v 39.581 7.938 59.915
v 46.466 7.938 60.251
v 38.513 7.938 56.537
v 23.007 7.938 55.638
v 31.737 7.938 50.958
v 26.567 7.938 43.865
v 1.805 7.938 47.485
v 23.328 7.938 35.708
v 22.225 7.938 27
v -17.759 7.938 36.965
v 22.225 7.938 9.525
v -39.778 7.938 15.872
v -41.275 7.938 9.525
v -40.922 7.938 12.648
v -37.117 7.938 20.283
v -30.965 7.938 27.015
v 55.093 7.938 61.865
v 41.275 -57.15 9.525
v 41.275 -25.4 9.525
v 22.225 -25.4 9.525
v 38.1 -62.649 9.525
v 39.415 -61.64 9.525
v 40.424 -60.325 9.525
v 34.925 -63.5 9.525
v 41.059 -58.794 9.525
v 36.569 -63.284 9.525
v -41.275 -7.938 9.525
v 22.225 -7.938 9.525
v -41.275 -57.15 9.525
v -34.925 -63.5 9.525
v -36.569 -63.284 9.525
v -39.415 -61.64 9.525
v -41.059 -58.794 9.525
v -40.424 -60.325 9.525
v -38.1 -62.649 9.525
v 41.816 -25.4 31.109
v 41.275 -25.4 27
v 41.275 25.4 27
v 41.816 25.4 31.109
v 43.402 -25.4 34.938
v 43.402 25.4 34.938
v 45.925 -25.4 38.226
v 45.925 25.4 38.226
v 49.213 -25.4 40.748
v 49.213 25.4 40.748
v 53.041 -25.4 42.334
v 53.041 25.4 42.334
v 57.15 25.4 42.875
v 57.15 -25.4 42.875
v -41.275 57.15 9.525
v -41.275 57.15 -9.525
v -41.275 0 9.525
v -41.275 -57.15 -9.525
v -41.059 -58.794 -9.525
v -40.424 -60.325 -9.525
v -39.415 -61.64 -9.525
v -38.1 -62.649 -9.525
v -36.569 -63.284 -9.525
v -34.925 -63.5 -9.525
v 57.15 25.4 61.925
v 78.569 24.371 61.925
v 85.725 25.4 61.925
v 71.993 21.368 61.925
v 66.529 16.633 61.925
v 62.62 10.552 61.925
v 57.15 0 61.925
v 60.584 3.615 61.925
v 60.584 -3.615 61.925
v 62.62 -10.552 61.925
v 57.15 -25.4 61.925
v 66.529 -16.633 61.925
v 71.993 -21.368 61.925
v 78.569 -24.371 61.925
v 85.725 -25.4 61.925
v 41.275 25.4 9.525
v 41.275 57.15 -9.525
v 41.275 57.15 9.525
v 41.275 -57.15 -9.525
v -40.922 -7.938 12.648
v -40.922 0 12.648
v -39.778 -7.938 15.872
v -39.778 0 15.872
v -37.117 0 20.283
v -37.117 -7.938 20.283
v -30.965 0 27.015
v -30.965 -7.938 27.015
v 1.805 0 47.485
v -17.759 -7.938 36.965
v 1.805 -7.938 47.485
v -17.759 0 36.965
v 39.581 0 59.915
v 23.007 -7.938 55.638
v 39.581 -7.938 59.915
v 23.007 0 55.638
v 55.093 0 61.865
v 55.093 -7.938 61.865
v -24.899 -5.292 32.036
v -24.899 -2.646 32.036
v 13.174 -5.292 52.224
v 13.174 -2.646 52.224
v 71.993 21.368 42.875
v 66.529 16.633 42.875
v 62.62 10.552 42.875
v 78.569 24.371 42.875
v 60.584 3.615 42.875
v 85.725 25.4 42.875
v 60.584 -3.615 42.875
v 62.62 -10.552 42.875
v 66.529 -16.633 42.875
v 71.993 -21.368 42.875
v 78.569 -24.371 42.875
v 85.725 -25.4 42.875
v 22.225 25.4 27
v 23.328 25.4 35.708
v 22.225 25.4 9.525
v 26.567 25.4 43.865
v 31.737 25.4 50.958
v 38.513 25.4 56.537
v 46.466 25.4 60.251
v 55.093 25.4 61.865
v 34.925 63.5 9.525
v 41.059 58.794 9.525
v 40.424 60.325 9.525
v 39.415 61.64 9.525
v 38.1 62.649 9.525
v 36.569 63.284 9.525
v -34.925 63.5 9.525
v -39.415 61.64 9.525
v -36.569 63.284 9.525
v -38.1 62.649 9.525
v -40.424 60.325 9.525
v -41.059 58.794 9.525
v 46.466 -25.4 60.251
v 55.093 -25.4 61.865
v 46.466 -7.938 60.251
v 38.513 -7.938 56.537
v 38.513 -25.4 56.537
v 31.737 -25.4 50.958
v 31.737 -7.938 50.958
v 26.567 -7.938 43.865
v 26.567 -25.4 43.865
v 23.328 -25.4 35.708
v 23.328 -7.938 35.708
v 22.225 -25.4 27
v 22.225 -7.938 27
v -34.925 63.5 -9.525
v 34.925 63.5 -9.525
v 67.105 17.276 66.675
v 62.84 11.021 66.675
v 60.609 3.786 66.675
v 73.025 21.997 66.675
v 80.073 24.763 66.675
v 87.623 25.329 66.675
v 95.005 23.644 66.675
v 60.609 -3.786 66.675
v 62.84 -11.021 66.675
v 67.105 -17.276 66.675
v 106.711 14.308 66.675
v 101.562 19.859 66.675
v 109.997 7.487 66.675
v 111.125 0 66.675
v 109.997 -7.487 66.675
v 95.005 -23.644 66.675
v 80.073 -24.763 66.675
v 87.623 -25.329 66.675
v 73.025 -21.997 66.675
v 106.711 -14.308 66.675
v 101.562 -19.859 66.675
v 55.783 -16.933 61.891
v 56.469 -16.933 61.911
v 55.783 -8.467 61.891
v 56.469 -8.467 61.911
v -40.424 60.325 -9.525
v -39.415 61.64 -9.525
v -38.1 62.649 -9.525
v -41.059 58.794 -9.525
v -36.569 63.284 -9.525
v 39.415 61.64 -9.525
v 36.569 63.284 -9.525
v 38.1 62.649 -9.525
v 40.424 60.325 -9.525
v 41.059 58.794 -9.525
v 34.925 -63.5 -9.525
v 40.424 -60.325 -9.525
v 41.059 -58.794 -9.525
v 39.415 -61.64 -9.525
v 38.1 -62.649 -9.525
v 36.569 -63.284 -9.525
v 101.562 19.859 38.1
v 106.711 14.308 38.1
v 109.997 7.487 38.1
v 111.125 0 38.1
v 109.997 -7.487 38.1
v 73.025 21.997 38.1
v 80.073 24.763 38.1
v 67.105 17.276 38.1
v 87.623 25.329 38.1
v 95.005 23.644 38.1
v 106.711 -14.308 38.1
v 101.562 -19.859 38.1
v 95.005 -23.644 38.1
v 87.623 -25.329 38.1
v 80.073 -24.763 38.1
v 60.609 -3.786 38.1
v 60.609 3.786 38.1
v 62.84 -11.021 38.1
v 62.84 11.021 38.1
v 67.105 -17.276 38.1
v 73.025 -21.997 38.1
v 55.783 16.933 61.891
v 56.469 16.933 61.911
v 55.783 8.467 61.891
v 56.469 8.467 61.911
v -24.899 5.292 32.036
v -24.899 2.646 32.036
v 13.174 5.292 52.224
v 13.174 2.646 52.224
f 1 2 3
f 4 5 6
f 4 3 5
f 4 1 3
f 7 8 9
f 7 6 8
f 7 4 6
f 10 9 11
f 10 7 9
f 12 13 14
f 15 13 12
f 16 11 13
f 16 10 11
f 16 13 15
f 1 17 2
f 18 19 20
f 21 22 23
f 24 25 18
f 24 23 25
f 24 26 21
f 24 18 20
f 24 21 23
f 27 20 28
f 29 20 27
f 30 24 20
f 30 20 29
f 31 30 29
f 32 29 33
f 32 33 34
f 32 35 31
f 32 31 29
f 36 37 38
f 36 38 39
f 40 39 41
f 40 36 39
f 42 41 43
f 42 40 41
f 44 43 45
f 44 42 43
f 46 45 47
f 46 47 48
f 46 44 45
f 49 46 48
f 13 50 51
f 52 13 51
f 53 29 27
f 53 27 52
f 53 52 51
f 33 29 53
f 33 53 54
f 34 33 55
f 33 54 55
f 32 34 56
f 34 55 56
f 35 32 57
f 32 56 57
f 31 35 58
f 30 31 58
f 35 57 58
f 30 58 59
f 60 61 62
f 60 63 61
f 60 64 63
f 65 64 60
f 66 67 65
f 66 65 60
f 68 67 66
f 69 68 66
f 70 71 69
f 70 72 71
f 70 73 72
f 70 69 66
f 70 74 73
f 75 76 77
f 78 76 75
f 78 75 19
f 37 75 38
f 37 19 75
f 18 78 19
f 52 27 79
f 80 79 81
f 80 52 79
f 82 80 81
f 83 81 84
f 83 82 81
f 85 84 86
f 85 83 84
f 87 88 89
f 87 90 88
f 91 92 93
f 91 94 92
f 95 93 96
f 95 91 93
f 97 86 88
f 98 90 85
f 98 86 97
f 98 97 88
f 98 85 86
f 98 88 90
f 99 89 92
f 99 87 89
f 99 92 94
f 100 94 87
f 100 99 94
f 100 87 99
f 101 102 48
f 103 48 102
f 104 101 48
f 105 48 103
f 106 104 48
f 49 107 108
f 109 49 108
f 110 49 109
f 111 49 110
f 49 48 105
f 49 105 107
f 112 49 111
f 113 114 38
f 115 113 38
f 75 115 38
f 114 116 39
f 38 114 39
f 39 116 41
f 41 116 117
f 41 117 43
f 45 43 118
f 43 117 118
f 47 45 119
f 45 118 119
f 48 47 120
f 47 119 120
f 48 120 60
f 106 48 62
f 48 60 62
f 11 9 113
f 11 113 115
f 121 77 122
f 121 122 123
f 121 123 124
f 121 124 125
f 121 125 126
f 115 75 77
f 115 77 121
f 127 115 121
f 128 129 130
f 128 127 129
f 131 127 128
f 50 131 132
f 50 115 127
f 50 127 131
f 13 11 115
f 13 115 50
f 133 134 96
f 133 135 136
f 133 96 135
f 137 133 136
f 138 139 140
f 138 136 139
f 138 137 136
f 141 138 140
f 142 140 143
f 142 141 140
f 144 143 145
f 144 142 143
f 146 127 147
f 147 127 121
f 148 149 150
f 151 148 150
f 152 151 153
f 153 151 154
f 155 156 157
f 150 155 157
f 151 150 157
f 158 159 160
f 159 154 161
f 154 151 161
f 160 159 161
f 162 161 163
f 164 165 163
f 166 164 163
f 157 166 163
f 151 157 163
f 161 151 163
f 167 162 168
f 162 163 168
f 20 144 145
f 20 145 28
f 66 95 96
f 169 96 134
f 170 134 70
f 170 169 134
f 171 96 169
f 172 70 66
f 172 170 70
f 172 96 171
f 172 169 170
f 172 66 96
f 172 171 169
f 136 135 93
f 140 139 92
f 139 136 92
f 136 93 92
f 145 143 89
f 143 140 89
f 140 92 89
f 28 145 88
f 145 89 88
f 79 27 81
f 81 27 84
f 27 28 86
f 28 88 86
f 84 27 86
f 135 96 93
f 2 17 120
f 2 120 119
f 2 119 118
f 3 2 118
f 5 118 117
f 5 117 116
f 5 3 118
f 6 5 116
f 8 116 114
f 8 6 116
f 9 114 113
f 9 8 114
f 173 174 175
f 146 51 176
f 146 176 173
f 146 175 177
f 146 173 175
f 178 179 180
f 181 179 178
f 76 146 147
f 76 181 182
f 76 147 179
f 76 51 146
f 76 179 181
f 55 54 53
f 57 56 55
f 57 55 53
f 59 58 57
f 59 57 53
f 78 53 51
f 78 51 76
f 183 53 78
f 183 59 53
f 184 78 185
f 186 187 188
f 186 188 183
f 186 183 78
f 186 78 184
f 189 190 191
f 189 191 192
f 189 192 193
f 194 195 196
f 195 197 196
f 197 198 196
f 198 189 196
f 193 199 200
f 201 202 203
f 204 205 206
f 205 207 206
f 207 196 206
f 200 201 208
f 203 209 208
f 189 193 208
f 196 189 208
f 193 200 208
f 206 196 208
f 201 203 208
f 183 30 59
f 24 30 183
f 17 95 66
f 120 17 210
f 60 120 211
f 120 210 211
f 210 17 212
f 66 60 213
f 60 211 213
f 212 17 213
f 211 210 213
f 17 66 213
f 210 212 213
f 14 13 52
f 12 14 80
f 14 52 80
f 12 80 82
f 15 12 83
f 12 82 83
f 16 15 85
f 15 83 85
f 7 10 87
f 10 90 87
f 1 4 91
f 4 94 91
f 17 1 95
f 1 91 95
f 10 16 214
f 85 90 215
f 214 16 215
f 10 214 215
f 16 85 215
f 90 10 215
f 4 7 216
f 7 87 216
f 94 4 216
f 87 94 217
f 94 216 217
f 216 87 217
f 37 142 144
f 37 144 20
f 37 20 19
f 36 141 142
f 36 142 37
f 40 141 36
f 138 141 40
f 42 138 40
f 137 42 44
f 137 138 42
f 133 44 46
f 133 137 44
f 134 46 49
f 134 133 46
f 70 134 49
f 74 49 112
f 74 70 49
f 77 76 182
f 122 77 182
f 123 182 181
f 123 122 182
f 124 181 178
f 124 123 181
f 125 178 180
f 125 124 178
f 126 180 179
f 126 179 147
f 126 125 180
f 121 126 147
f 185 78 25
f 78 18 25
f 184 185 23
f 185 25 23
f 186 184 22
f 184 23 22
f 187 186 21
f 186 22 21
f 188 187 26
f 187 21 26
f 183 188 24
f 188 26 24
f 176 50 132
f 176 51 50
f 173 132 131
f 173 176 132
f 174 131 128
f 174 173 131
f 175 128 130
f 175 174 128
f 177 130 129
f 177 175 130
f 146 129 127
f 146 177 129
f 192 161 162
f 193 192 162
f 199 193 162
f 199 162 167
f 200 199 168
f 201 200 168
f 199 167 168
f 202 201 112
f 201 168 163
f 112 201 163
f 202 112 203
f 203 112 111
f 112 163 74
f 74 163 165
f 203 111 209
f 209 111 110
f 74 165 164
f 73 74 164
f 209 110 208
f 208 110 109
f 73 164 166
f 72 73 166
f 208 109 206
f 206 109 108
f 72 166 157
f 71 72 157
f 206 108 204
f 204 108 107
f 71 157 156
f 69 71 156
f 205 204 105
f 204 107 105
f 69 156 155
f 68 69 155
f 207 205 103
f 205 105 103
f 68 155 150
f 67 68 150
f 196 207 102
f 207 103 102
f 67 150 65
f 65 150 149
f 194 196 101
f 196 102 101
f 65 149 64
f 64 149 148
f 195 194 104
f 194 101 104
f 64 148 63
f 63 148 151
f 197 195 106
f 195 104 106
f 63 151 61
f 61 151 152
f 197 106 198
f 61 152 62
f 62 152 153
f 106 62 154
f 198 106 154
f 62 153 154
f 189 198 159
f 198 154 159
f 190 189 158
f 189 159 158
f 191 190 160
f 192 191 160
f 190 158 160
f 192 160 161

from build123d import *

# Parameters (mm, degrees)
F1_DEPTH = 63.5
F2_DEPTH = 25.4
F3_DEPTH = 7.9375
F5_R     = 6.35


with BuildPart() as f1:
    # F0 (on Front) → F1 (new body, symmetric)
    with BuildSketch(Plane.XZ):
        Polygon((-41.275, 9.525), (-41.275, -9.525), (41.275, -9.525), (41.275, 9.525), (22.225, 9.525), align=None)
    extrude(amount=F1_DEPTH, both=True)

    # F0 (on Front) → F2 (join, symmetric)
    with BuildSketch(Plane.XZ):
        Polygon((85.725, 61.9252), (60.325, 61.9252), (60.325, 42.8752), (85.725, 42.8752), (85.725, 52.3875), align=None)
        with BuildLine():
            Line((22.225, 9.525), (41.275, 9.525))
            Line((41.275, 9.525), (41.275, 27.0002))
            ThreePointArc((41.275, 27.0002), (45.92468, 38.22552), (57.15, 42.8752))
            Line((57.15, 42.8752), (60.325, 42.8752))
            Line((60.325, 42.8752), (60.325, 61.9252))
            Line((60.325, 61.9252), (57.15, 61.9252))
            add(Edge.make_bspline(
                [(55.092977, 61.86457), (55.785837, 61.89427), (56.471675, 61.914556), (57.15, 61.9252)],
                knots=[109.502305, 109.502305, 109.502305, 109.502305, 111.504536, 111.504536, 111.504536, 111.504536], degree=3))
            ThreePointArc((55.092977, 61.86457), (31.737433, 50.957601), (22.225, 27.0002))
            Line((22.225, 27.0002), (22.225, 9.525))
        make_face()
    extrude(amount=F2_DEPTH, both=True)

    # F0 (on Front) → F3 (join, symmetric)
    with BuildSketch(Plane.XZ):
        with BuildLine():
            add(Edge.make_bspline(
                [(-41.275, 9.525), (-41.696727, 30.455088), (17.200338, 60.240237), (55.092977, 61.86457)],
                knots=[0, 0, 0, 0, 109.502305, 109.502305, 109.502305, 109.502305], degree=3))
            Line((-41.275, 9.525), (22.225, 9.525))
            Line((22.225, 9.525), (22.225, 27.0002))
            ThreePointArc((22.225, 27.0002), (31.737433, 50.957601), (55.092977, 61.86457))
        make_face()
    extrude(amount=F3_DEPTH, both=True)

    # F0 (on Front) → F4 (revolve)
    with BuildSketch(Plane.XZ):
        Polygon((85.725, 66.675), (85.725, 61.9252), (85.725, 52.3875), (85.725, 42.8752), (85.725, 38.1), (111.125, 38.1), (111.125, 66.675), align=None)
    revolve(axis=Axis((85.725, 0, 47.63135), (0, 0, -1)))

    # F5
    f5_edges = [f1.edges().sort_by_distance(p)[0] for p in [
        (-41.275, -63.5, 0),
        (41.275, 63.5, 0),
        (41.275, -63.5, 0),
        (-41.275, 63.5, 0),
    ]]
    fillet(f5_edges, radius=F5_R)


solid = f1.part
